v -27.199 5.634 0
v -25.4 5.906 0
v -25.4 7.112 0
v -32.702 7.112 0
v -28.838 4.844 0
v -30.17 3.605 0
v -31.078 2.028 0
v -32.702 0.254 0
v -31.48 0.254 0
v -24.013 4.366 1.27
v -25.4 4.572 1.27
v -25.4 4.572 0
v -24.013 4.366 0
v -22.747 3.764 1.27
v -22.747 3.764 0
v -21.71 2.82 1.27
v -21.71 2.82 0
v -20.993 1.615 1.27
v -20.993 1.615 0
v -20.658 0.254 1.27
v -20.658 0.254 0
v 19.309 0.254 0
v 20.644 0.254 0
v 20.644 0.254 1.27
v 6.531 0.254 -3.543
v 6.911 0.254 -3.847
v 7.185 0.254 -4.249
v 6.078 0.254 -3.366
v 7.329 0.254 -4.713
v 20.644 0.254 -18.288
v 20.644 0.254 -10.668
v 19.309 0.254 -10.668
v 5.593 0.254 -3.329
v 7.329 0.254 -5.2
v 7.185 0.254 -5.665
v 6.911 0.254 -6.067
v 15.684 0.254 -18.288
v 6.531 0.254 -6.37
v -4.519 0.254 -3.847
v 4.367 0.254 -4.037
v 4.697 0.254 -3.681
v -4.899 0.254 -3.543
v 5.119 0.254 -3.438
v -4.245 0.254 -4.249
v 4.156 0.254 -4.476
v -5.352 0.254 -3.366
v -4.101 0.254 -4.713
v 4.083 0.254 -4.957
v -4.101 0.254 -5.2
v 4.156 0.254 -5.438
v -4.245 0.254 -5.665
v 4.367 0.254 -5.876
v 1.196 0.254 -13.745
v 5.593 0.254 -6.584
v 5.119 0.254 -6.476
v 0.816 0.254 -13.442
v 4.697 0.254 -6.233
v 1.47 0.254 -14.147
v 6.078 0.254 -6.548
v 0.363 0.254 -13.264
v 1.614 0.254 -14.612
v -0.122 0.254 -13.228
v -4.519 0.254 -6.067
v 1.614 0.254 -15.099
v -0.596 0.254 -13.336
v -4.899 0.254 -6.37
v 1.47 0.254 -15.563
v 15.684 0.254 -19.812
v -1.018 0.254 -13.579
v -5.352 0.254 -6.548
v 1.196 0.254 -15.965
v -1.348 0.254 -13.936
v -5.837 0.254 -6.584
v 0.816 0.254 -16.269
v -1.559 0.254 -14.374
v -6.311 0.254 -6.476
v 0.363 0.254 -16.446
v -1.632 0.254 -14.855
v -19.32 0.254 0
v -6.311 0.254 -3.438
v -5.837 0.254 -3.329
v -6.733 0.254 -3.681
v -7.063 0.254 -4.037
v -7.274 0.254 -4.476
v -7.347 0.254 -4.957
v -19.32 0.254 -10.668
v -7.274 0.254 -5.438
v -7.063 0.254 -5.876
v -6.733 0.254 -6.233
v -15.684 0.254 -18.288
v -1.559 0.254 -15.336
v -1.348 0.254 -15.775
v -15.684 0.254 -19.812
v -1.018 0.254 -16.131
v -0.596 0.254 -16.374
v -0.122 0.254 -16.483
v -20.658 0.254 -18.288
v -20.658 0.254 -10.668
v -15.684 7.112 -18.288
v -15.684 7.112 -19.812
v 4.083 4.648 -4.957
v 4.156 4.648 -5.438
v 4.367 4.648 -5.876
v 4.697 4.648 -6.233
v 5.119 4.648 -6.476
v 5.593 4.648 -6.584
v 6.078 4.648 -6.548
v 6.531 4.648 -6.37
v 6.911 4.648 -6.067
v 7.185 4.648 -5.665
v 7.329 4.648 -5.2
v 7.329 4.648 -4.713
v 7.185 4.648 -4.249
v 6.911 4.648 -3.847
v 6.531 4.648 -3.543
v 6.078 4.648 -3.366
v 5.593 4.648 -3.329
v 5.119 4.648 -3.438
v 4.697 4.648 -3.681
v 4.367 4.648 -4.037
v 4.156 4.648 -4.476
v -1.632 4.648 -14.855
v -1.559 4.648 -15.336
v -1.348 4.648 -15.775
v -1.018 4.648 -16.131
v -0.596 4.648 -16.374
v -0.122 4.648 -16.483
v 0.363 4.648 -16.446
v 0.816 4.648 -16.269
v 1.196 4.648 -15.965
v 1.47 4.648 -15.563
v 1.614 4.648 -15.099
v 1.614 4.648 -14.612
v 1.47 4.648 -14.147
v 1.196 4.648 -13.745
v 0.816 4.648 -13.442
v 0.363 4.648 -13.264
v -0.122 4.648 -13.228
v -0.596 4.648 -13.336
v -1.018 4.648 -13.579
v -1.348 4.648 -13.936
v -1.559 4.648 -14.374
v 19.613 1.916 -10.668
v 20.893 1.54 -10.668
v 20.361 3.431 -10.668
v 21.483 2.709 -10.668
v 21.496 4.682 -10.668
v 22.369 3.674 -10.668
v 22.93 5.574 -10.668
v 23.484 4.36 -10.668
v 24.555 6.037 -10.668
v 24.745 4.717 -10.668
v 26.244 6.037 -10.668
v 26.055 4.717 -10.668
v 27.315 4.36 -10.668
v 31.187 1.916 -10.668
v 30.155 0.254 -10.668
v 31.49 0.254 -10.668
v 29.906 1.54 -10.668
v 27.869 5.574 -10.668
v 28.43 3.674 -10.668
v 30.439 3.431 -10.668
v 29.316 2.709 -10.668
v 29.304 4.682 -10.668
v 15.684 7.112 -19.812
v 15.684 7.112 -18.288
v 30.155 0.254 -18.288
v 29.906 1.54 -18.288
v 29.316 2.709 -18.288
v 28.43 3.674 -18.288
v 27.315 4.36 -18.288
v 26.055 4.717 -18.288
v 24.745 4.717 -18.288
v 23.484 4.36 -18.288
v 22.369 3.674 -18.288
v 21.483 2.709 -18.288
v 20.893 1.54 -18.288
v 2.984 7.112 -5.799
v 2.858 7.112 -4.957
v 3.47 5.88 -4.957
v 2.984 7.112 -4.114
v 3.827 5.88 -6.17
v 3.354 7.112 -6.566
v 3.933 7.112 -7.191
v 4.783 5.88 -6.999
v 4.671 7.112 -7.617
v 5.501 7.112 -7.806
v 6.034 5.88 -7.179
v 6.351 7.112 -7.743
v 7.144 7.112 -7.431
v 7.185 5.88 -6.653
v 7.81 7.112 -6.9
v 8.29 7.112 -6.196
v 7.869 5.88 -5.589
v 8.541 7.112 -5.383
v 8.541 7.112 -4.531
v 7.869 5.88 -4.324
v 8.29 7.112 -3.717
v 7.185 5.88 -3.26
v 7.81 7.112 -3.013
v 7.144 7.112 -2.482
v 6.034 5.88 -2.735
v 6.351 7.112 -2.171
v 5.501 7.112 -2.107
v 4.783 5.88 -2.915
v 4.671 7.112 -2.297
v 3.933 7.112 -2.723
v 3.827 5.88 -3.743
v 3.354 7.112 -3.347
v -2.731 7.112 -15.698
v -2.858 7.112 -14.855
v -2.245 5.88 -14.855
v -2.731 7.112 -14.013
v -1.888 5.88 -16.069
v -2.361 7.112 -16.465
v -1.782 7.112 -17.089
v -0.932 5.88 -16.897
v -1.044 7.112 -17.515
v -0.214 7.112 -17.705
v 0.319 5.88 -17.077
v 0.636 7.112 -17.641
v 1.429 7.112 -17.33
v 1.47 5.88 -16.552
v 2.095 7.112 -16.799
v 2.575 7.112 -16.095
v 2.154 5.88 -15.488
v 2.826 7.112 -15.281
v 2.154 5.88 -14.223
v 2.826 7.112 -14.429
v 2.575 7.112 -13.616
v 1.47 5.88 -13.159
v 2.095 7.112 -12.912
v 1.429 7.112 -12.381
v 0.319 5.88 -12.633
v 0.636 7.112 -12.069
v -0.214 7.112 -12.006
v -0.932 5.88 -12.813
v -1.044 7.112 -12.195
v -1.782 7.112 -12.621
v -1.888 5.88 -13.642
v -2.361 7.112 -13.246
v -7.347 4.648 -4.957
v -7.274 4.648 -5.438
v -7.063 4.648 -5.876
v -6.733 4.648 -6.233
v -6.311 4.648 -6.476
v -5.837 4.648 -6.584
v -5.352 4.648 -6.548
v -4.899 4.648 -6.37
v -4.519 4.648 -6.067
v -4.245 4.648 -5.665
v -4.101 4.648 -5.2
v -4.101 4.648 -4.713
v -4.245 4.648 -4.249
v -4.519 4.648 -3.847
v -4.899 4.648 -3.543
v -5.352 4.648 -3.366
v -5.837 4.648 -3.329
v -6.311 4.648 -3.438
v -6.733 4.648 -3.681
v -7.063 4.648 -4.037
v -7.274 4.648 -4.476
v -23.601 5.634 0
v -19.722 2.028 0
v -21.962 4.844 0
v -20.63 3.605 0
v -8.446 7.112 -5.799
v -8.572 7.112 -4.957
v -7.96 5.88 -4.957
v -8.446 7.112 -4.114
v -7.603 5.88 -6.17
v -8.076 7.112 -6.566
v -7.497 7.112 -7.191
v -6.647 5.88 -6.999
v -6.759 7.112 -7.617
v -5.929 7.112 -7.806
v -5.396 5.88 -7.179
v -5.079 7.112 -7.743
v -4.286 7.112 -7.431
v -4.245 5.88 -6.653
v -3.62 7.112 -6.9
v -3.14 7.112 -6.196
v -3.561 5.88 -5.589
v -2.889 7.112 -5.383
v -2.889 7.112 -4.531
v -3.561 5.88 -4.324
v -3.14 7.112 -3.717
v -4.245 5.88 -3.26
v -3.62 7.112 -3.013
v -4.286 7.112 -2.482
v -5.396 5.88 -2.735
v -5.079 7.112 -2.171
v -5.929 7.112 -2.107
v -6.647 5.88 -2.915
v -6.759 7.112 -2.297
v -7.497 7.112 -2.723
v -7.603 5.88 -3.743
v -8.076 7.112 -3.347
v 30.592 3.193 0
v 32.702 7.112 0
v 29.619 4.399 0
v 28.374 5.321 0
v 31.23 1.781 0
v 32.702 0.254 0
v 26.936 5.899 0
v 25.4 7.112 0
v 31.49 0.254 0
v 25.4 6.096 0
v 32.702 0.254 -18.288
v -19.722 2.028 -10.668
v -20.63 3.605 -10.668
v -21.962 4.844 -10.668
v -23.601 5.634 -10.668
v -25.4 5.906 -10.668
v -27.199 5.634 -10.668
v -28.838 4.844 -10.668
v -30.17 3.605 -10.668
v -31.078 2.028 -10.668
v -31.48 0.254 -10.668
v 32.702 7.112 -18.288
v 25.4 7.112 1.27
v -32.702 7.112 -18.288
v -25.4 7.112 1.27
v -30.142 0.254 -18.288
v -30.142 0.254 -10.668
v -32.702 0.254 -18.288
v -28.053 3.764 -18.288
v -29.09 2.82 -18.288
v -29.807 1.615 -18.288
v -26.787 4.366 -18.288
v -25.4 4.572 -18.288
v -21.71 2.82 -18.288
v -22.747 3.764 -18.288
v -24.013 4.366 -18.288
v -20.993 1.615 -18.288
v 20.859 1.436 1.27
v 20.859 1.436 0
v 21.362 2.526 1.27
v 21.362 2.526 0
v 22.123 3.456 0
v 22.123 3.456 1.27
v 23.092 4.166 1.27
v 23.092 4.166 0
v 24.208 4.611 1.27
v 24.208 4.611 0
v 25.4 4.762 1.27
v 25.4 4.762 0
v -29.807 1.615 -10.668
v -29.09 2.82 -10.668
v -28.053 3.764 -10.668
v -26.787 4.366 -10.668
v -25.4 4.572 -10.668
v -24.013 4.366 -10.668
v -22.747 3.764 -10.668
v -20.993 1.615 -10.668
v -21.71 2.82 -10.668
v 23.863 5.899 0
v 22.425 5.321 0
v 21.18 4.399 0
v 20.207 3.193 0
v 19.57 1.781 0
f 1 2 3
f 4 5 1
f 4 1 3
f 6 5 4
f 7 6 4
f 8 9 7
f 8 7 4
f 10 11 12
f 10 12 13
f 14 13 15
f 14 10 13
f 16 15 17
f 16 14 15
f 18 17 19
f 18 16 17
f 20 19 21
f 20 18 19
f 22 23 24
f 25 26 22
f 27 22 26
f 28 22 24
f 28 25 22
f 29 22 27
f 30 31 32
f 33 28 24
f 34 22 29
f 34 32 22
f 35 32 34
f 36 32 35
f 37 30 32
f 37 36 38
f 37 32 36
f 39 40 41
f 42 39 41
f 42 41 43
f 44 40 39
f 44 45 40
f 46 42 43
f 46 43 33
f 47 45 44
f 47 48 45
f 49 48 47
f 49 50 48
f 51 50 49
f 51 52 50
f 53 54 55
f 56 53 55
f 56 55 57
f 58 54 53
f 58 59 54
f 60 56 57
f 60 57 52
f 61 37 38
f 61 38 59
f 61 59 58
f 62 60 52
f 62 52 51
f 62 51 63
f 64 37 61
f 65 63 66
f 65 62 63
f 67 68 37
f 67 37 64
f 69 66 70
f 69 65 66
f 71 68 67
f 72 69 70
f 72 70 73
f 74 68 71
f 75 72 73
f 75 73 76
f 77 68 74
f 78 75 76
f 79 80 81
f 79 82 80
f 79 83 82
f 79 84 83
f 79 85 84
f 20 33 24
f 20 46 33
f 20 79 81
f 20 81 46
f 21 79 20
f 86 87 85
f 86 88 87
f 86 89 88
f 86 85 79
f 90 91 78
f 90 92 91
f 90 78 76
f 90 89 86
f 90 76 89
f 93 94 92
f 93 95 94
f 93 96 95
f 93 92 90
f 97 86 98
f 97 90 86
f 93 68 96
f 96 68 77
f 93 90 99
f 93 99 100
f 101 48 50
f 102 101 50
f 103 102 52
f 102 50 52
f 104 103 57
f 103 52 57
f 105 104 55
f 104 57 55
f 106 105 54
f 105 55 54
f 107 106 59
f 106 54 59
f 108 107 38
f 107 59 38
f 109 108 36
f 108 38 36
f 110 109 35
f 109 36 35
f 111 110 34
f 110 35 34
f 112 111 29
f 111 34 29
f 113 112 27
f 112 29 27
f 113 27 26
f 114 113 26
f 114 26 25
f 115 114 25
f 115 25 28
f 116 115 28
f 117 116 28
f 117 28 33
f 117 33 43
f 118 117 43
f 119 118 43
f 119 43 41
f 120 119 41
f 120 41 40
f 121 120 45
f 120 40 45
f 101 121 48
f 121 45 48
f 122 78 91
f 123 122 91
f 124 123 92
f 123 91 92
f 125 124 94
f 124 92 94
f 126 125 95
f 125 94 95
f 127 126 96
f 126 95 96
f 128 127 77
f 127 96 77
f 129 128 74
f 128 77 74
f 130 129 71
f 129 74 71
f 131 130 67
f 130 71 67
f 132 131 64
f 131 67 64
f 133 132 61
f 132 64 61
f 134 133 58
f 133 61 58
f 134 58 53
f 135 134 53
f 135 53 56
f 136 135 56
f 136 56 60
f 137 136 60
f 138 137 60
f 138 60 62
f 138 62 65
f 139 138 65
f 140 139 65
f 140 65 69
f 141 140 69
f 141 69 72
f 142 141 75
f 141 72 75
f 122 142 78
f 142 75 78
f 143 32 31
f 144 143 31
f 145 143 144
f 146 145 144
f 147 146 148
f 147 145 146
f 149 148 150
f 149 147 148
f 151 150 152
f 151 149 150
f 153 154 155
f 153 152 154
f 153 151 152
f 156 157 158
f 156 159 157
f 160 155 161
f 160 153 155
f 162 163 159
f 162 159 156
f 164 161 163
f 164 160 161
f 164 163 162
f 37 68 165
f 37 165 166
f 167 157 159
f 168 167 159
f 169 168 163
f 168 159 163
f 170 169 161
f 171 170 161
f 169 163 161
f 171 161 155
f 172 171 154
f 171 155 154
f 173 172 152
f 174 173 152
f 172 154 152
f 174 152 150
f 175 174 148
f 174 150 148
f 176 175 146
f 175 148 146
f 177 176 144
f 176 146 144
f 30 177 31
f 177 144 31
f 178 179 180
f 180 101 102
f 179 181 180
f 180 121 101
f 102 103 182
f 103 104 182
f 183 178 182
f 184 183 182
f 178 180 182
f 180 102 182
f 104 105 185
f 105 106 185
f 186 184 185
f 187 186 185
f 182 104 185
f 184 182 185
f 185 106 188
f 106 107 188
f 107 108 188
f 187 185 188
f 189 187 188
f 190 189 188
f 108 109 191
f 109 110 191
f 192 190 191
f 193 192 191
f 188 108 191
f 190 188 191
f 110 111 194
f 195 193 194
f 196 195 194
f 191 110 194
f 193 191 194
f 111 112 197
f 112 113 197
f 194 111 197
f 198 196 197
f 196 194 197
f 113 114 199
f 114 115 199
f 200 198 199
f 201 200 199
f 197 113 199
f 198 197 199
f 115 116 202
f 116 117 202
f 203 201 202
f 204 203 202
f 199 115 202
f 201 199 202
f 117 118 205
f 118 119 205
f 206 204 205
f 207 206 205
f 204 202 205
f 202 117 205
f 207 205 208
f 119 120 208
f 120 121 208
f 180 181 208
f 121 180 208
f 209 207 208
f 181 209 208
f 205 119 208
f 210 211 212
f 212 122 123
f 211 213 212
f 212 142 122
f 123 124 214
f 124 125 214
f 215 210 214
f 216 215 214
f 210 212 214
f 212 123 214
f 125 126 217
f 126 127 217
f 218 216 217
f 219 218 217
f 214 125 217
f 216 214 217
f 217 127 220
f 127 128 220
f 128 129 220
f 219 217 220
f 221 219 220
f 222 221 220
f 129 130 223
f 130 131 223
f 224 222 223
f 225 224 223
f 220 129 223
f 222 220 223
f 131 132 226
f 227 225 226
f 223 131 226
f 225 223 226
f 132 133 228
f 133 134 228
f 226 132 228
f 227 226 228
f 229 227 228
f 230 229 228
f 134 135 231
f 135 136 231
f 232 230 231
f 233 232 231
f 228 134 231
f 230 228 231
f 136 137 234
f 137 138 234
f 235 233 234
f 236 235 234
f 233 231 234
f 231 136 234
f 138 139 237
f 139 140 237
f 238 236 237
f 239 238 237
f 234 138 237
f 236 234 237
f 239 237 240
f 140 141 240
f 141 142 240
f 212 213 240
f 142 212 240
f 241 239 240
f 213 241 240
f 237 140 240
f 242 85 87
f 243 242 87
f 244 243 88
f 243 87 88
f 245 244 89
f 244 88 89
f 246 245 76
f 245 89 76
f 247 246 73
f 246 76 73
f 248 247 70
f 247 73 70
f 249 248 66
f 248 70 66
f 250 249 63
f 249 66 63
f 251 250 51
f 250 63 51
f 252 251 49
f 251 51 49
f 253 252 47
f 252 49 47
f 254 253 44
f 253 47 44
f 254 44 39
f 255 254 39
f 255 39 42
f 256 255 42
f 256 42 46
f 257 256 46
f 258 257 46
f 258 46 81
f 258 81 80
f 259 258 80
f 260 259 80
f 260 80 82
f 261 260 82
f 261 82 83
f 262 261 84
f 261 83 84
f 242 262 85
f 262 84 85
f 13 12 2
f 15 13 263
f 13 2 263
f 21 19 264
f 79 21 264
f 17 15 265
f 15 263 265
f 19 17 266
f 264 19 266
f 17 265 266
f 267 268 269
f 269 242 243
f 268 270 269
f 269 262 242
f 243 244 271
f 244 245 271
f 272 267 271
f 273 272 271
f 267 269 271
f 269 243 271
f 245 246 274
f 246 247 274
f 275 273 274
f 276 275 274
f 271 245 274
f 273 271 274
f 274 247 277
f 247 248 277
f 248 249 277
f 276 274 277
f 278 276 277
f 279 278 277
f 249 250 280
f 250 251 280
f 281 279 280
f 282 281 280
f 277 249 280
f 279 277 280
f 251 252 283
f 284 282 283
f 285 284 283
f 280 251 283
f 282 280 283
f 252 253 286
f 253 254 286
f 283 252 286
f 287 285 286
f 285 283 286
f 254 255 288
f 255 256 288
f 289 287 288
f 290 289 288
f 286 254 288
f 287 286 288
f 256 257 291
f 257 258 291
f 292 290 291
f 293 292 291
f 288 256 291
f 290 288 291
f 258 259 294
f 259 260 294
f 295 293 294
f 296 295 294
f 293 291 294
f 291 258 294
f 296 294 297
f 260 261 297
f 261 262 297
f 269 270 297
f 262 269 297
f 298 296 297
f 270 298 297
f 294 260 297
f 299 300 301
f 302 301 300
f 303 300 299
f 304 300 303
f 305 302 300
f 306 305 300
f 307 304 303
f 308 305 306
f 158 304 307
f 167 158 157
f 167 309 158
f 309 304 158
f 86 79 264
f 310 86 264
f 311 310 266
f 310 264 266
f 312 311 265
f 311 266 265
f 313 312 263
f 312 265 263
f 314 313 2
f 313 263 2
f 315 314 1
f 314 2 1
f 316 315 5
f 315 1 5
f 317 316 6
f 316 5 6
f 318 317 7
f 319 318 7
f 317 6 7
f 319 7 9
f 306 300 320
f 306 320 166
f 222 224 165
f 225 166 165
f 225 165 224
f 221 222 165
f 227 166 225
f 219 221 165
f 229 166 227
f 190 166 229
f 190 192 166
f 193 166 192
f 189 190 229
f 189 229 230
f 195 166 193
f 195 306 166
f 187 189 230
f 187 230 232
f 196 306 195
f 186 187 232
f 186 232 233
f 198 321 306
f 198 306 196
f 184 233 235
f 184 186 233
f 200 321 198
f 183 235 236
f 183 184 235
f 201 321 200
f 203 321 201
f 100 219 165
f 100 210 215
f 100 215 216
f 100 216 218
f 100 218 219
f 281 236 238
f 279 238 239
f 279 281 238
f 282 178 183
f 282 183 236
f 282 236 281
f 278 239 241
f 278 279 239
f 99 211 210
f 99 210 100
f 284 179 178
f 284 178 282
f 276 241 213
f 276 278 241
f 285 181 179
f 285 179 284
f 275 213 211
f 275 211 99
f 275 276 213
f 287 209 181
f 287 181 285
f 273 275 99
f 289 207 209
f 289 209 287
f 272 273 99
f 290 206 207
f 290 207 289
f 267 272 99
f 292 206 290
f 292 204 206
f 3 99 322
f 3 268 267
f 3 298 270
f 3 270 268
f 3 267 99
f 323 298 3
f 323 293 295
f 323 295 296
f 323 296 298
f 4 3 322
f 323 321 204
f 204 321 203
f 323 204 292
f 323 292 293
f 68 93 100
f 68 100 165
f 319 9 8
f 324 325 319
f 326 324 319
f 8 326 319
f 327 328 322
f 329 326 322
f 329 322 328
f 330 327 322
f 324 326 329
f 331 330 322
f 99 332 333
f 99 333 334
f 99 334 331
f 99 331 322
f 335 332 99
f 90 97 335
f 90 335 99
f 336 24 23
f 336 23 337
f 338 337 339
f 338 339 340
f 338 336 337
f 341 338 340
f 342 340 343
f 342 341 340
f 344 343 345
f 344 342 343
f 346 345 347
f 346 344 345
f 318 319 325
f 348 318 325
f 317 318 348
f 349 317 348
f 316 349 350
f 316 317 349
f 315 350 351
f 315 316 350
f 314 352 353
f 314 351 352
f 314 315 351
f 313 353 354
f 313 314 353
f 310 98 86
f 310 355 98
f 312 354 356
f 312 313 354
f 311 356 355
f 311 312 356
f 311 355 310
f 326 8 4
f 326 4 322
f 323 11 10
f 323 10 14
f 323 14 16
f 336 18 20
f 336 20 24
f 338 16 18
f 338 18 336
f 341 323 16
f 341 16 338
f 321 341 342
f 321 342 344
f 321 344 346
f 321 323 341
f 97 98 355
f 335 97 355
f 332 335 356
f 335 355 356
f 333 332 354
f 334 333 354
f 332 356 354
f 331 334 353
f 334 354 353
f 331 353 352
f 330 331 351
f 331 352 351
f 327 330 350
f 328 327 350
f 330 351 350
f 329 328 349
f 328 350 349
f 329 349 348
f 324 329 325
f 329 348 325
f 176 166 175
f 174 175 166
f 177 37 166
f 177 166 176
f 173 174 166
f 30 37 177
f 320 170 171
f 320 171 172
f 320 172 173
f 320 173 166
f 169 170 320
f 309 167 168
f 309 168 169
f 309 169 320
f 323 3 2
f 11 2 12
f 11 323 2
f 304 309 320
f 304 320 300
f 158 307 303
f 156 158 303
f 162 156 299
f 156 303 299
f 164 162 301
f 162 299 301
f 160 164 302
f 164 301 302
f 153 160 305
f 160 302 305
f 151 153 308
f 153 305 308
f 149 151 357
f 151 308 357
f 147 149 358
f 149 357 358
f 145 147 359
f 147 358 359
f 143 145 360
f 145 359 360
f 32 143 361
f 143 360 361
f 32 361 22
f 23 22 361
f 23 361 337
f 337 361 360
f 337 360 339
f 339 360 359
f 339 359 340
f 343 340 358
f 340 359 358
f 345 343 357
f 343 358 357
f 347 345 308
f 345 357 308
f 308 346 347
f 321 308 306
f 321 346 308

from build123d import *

# Parameters (mm, degrees)
BOSS_EXTRUDE1_DEPTH                               = 7.112
SKETCH2_R                                         = 4.7625
CUT_EXTRUDE1_DEPTH                                = 39.891507997
SKETCH3_R                                         = 6.096
CUT_EXTRUDE2_DEPTH                                = 10.668
CSK_FOR_4_FLAT_HEAD_MACHINE_SCREW_100_D           = 3.2639
CSK_FOR_4_FLAT_HEAD_MACHINE_SCREW_100_CSINK_D     = 5.715
CSK_FOR_4_FLAT_HEAD_MACHINE_SCREW_100_CSINK_ANGLE = 52.893588
BOSS_EXTRUDE2_START                               = 1.27
BOSS_EXTRUDE2_DEPTH                               = 1.27
SKETCH12_W                                        = 65.405
SKETCH12_H                                        = 0.254
CUT_EXTRUDE3_DEPTH                                = 40.553568414


with BuildPart() as part:
    # Sketch1 → Boss-Extrude1 (new body)
    with BuildSketch(Plane(origin=(0, 0, 0), x_dir=(1, 0, 0), z_dir=(0, 1, 0))):
        Polygon((32.7025, 0), (-32.7025, 0), (-32.7025, 18.288), (-15.6845, 18.288), (-15.6845, 19.812), (15.6845, 19.812), (15.6845, 18.288), (32.7025, 18.288), align=None)
    extrude(amount=BOSS_EXTRUDE1_DEPTH)

    # Sketch2 → Cut-Extrude1 (cut, through all)
    with BuildSketch(Plane.XY):
        with Locations((-25.4, -0.1905)):
            Circle(SKETCH2_R)
        with Locations((25.399642811, 0)):
            Circle(SKETCH2_R)
    extrude(amount=-CUT_EXTRUDE1_DEPTH, mode=Mode.SUBTRACT)

    # Sketch3 → Cut-Extrude2 (cut)
    with BuildSketch(Plane.XY):
        with Locations((-25.4, -0.1905)):
            Circle(SKETCH3_R)
        with Locations((25.399642811, 0)):
            Circle(SKETCH3_R)
    extrude(amount=-CUT_EXTRUDE2_DEPTH, mode=Mode.SUBTRACT)

    # CSK for #4 Flat Head Machine Screw (100)1 (through all)
    with Locations(Plane(origin=(0, 7.112, 0), x_dir=(1, 0, 0), z_dir=(0, 1, 0))):
        with Locations((0, 14.855335183), (-5.715, 4.956664817), (5.715, 4.956664817)):
            CounterSinkHole(CSK_FOR_4_FLAT_HEAD_MACHINE_SCREW_100_D / 2, CSK_FOR_4_FLAT_HEAD_MACHINE_SCREW_100_CSINK_D / 2, counter_sink_angle=CSK_FOR_4_FLAT_HEAD_MACHINE_SCREW_100_CSINK_ANGLE)

    # Sketch11 → Boss-Extrude2 (add)
    with BuildSketch(Plane.XY.offset(BOSS_EXTRUDE2_START)):
        with BuildLine():
            Line((-20.641311525, 0), (20.637142811, 0))
            ThreePointArc((20.637142811, 0), (22.032046766, 3.367596045), (25.399642811, 4.7625))
            Line((25.399642811, 4.7625), (25.399642811, 7.112))
            Line((25.399642811, 7.112), (-25.4, 7.112))
            Line((-25.4, 7.112), (-25.4, 4.572))
            ThreePointArc((-25.4, 4.572), (-22.100443212, 3.24378759), (-20.641311525, 0))
        make_face()
    extrude(amount=-BOSS_EXTRUDE2_DEPTH)

    # Sketch12 → Cut-Extrude3 (cut, through all)
    with BuildSketch(Plane(origin=(0, 0, -19.812), x_dir=(-1, 0, 0), z_dir=(0, 0, -1))):
        with Locations((0, 0.127)):
            Rectangle(SKETCH12_W, SKETCH12_H)
    extrude(amount=-CUT_EXTRUDE3_DEPTH, mode=Mode.SUBTRACT)


solid = part.part
